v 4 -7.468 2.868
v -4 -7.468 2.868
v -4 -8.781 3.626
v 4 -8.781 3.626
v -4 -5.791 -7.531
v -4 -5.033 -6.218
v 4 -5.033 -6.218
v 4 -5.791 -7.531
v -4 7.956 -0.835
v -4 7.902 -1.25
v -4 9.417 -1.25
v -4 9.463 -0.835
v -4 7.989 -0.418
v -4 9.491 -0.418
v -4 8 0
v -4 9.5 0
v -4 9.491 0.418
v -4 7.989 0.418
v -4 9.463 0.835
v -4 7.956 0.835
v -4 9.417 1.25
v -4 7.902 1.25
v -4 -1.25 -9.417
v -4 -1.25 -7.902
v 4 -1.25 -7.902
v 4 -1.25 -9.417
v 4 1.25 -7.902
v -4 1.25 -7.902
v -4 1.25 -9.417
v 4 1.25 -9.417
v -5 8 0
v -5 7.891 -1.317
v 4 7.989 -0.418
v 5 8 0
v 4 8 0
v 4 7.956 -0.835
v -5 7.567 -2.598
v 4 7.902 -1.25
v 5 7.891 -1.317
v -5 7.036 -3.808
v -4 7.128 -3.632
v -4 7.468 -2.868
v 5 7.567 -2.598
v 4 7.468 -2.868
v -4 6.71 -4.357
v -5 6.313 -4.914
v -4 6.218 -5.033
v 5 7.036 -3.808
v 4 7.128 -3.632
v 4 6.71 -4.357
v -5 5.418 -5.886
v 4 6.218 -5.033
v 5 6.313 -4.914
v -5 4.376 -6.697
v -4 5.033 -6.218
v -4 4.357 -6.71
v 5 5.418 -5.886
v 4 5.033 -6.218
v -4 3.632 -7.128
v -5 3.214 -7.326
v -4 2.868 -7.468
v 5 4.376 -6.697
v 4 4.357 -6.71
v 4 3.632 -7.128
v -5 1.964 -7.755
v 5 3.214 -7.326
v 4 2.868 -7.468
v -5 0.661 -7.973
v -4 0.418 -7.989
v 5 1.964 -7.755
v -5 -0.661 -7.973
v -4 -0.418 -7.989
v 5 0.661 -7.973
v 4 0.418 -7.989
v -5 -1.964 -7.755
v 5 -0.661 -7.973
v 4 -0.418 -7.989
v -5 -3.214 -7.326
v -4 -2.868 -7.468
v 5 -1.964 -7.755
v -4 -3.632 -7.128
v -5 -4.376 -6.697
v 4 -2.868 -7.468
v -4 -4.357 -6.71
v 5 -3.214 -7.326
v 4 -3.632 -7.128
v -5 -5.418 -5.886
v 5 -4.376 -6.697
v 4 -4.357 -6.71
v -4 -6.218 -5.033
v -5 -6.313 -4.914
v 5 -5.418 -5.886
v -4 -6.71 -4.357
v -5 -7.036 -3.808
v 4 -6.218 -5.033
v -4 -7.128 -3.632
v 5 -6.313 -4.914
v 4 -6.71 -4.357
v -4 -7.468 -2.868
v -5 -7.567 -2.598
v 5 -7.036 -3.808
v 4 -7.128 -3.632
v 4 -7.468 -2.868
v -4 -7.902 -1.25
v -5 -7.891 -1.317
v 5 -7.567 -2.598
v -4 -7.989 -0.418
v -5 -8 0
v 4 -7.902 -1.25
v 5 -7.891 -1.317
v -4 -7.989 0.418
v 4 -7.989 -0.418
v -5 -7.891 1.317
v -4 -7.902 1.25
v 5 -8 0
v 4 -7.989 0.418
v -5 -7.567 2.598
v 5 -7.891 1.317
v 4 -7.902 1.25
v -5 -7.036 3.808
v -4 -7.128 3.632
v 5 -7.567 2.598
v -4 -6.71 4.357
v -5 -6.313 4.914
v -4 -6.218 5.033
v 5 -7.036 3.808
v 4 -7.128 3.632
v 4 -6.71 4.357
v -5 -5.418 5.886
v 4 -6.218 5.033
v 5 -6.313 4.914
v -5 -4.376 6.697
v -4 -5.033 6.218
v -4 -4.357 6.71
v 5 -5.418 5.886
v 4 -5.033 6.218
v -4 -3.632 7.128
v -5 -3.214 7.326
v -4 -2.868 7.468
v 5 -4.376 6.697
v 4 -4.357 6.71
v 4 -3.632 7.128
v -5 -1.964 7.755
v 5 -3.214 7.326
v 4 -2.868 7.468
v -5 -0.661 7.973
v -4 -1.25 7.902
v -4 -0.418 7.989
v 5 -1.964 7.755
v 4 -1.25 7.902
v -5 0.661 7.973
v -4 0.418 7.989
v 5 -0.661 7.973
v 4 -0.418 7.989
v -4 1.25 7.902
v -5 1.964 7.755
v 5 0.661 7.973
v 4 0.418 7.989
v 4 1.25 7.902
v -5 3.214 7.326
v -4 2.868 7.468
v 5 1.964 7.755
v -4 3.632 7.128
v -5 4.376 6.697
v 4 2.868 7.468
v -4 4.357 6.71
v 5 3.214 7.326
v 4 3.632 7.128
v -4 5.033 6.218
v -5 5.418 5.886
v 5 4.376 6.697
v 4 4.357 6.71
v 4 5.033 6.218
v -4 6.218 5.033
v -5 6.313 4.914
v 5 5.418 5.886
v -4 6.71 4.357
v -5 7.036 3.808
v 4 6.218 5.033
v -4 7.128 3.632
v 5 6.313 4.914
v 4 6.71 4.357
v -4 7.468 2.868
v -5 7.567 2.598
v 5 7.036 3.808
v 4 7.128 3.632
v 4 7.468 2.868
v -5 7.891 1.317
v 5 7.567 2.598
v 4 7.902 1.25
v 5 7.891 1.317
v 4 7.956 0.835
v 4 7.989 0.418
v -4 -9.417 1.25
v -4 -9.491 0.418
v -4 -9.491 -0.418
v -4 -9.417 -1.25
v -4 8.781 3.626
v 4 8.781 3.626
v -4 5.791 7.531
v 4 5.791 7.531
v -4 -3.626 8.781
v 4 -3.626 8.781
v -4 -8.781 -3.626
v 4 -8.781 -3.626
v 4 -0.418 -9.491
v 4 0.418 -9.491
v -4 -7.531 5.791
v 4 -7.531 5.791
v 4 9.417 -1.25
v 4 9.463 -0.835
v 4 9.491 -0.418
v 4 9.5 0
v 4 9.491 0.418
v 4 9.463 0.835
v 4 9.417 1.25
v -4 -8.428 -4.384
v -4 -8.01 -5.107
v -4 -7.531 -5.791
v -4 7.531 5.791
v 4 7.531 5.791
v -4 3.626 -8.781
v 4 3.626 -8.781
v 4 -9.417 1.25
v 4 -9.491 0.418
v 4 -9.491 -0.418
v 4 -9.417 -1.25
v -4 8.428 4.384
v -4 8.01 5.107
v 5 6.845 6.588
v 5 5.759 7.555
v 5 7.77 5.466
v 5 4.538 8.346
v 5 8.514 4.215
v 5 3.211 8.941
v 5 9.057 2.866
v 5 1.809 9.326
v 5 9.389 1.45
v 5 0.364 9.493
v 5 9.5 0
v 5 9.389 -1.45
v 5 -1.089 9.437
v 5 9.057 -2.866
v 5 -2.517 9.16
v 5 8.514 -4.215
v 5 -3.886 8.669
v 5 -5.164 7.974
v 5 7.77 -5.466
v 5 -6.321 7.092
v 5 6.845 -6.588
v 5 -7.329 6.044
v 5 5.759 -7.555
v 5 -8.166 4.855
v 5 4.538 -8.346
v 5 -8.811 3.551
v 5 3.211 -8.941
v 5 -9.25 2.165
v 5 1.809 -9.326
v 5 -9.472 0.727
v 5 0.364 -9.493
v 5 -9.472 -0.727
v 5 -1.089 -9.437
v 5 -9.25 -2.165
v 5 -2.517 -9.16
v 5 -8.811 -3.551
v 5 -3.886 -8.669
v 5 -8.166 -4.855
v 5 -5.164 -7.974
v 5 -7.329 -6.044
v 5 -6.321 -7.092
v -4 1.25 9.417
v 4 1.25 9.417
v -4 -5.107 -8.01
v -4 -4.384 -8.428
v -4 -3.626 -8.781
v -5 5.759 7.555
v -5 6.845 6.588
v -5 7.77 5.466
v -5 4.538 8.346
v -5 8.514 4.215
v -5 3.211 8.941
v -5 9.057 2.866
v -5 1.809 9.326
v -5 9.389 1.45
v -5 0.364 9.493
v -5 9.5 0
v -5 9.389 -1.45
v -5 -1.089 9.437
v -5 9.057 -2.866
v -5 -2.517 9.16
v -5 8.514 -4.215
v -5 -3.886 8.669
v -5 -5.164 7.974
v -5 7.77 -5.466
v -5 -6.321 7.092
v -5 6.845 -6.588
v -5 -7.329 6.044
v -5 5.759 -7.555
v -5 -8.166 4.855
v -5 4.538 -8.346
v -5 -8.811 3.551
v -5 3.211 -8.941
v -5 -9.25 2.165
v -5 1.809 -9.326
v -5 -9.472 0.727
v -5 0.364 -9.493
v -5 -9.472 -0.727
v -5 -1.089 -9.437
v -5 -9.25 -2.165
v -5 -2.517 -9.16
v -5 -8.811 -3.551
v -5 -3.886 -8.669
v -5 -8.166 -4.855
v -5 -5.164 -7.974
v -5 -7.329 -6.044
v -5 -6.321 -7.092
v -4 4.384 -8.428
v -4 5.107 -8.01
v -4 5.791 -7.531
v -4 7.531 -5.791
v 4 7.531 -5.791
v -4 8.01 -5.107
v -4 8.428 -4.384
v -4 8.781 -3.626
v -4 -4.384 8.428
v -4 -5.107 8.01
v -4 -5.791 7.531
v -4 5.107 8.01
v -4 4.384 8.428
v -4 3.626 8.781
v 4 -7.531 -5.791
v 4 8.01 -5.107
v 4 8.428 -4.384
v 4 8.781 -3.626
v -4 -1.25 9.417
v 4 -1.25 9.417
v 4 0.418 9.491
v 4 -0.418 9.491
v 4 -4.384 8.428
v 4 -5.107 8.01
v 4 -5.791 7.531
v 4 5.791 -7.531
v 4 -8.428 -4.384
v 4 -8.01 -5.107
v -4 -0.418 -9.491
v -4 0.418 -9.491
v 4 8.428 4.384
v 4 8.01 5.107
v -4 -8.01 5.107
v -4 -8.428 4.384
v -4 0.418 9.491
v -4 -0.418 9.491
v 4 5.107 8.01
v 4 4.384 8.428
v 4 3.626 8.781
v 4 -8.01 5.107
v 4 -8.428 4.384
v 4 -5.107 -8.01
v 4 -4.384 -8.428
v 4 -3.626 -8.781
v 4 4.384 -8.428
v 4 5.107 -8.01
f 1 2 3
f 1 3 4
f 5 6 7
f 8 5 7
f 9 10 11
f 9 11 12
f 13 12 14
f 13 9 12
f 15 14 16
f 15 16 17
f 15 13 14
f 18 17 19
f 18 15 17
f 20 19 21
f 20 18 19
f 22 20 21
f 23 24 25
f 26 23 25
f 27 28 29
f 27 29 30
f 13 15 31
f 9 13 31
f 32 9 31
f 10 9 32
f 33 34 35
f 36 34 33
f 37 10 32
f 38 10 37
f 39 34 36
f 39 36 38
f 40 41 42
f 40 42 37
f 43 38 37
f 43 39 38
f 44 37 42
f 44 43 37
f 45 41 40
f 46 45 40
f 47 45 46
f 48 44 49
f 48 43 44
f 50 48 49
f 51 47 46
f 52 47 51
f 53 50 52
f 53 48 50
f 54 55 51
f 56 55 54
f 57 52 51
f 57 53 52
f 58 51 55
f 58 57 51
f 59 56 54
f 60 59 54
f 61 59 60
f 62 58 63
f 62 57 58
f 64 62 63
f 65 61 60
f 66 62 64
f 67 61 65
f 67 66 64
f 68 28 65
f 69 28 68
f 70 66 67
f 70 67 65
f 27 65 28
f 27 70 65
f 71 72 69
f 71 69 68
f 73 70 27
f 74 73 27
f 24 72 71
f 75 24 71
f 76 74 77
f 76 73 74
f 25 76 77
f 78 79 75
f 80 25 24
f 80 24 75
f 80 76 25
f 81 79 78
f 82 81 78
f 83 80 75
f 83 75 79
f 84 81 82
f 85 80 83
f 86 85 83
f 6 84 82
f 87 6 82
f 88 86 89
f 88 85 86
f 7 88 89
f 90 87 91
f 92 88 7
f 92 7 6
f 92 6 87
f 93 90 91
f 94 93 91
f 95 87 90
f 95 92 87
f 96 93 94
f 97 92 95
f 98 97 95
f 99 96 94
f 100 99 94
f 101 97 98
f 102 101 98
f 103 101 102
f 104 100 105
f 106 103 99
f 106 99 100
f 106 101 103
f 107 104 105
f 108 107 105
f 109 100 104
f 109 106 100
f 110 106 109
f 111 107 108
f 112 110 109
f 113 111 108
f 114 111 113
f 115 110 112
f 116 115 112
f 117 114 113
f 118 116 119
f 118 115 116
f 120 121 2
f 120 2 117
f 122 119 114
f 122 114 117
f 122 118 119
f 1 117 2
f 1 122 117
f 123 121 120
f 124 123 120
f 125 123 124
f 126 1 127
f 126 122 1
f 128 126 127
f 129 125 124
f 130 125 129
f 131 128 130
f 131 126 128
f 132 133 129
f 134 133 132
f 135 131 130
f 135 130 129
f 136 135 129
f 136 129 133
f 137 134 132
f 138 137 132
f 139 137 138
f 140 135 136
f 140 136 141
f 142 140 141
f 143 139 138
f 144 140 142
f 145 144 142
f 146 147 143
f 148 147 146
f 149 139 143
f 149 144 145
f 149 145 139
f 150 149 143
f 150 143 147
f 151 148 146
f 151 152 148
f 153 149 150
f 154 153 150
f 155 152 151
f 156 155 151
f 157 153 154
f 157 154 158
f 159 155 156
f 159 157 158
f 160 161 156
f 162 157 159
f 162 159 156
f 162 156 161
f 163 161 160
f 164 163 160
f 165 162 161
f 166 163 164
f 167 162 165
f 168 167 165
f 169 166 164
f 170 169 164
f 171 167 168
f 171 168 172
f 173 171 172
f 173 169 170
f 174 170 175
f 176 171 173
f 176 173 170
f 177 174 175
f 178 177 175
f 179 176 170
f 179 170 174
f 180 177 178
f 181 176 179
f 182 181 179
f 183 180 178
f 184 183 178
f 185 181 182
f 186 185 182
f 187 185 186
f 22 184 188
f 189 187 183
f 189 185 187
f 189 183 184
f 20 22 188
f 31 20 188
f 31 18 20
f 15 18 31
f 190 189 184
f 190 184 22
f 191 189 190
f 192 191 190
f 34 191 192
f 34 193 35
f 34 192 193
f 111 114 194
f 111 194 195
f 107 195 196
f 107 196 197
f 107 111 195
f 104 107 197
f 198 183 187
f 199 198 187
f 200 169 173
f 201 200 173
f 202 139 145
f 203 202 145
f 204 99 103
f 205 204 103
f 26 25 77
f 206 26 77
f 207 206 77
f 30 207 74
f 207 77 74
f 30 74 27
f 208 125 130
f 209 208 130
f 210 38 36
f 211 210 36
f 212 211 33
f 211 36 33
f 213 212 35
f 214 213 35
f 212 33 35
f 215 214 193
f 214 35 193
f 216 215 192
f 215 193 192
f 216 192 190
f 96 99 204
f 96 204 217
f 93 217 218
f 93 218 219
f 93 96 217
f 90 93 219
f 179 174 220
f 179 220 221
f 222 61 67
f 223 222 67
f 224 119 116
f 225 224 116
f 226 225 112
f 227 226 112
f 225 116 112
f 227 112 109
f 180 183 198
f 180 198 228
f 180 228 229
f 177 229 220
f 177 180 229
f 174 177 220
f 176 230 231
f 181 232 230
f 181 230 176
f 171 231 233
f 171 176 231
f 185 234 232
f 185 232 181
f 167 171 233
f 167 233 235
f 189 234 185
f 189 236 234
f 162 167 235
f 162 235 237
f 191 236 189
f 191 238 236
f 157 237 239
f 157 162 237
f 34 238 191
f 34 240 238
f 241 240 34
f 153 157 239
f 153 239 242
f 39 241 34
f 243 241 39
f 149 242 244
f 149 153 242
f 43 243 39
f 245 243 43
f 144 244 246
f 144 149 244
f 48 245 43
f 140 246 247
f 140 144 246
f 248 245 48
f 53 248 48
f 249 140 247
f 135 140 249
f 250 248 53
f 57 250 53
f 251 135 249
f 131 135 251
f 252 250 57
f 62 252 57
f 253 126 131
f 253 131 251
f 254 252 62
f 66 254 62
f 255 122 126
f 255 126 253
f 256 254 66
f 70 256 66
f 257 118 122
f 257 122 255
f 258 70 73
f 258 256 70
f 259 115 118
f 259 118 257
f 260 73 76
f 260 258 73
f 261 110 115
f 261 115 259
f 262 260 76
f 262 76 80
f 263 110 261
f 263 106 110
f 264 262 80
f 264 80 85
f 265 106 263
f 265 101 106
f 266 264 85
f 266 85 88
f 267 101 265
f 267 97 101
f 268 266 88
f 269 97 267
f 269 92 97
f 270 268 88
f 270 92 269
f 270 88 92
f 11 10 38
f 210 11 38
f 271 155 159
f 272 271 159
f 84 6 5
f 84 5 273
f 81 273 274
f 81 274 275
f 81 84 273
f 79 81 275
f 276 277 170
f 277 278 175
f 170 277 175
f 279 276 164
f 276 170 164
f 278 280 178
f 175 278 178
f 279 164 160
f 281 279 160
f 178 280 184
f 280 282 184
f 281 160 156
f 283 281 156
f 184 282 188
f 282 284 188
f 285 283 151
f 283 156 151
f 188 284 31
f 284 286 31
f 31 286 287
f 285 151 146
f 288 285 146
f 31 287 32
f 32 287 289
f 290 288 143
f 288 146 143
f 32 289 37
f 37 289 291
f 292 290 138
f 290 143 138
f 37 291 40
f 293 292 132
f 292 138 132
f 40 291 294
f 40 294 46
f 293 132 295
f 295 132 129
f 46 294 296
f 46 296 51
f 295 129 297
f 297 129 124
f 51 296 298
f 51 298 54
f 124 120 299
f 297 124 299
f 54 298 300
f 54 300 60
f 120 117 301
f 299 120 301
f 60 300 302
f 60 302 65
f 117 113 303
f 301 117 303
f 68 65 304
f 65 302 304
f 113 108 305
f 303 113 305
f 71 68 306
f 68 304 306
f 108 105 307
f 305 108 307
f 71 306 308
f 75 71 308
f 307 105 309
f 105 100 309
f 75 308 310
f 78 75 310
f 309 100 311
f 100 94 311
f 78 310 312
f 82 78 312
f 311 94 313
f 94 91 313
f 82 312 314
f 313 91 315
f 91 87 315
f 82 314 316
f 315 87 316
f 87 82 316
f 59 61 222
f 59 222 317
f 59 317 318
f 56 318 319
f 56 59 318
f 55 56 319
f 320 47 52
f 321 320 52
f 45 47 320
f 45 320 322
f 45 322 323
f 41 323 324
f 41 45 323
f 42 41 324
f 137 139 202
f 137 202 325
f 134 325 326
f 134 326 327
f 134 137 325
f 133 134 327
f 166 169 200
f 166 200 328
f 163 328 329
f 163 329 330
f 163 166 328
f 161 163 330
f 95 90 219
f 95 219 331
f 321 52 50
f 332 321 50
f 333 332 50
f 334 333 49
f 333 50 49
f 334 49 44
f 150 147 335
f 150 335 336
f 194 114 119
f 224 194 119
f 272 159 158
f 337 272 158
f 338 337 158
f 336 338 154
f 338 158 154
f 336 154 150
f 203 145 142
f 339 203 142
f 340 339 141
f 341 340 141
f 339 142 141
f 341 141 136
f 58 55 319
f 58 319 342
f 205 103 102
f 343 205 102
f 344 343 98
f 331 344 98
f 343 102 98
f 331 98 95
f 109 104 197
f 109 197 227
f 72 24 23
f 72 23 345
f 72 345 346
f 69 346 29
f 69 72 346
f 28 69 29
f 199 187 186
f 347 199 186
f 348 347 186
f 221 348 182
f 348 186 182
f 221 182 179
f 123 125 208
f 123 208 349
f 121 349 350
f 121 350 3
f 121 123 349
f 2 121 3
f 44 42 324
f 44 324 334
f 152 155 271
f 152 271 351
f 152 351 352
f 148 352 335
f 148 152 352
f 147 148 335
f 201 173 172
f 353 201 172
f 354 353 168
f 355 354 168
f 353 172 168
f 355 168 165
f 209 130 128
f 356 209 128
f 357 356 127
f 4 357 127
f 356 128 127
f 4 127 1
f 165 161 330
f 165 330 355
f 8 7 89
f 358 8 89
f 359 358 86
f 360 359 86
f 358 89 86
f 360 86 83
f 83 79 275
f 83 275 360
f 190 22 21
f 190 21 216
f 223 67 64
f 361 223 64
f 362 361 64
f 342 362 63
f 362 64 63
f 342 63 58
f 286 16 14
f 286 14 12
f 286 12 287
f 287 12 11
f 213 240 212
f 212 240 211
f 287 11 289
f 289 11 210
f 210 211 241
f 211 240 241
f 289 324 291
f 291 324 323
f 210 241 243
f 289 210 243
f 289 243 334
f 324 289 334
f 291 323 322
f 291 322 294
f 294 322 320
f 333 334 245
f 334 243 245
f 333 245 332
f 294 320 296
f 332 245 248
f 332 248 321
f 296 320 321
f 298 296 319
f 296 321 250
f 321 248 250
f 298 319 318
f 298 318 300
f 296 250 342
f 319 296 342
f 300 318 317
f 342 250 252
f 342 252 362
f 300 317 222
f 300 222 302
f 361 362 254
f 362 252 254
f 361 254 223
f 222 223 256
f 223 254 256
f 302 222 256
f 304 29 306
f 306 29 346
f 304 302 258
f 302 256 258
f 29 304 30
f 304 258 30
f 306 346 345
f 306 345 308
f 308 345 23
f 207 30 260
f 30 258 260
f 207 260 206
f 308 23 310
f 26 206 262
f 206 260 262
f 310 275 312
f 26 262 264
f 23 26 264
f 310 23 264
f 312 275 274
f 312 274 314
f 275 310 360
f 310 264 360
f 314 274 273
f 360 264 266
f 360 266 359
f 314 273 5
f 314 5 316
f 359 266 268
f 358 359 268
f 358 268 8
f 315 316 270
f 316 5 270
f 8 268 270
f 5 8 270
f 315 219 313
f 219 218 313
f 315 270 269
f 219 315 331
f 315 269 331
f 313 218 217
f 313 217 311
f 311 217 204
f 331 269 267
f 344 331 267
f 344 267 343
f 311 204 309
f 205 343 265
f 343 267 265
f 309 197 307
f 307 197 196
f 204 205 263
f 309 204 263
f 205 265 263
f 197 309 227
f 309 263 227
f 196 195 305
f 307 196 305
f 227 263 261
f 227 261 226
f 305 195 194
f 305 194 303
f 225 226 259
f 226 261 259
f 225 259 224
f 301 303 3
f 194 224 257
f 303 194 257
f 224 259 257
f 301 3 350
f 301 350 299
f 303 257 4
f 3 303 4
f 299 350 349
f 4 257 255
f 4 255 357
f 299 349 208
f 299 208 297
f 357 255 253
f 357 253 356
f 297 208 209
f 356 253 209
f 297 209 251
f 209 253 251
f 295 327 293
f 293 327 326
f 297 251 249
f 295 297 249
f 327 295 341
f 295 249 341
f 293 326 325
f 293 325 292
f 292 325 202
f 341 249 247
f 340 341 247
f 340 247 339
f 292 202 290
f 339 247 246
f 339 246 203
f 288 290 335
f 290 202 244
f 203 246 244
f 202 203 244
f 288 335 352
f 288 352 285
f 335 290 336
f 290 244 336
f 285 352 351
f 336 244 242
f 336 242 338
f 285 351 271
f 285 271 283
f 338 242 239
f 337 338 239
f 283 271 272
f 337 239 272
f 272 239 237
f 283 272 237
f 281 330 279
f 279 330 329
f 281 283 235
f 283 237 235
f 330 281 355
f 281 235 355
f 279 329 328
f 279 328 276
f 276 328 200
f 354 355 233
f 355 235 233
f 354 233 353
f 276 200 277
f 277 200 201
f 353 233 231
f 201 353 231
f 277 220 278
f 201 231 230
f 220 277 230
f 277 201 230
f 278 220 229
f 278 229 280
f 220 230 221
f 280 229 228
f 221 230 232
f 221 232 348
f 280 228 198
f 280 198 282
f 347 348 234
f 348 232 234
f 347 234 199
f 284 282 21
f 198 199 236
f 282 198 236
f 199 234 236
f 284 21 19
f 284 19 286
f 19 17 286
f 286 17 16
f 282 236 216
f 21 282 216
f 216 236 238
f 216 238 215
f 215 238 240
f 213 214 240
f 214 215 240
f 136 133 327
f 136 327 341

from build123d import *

# Parameters (mm, degrees)
ESQUISSE1_W                  = 10
ESQUISSE1_H                  = 1.5
ESQUISSE2_W                  = 8
ESQUISSE2_H                  = 2.5
ENL_V_MAT_EXTRU_1_DEPTH      = 10.5
R_P_TITION_CIRCULAIRE1_COUNT = 12


with BuildPart() as part:
    # Esquisse1 → Base-Révolution (revolve)
    with BuildSketch(Plane.XY):
        with Locations((0, 8.75)):
            Rectangle(ESQUISSE1_W, ESQUISSE1_H)
    revolve(axis=Axis((11.7, 0, 0), (-1, 0, 0)))

    # Esquisse2 → Enlèv. mat.-Extru.1 (cut, through all)
    with BuildSketch(Plane.XY):
        Rectangle(ESQUISSE2_W, ESQUISSE2_H)
    enl_v_mat_extru_1 = extrude(amount=-ENL_V_MAT_EXTRU_1_DEPTH, mode=Mode.SUBTRACT)

    # Répétition circulaire1: Enlèv. mat.-Extru.1 ×12 about axis
    r_p_tition_circulaire1_axis = Axis((-50, 0, 0), (1, 0, 0))
    for i in range(1, R_P_TITION_CIRCULAIRE1_COUNT):
        add(enl_v_mat_extru_1.rotate(r_p_tition_circulaire1_axis, i * 360 / R_P_TITION_CIRCULAIRE1_COUNT), mode=Mode.SUBTRACT)


solid = part.part
